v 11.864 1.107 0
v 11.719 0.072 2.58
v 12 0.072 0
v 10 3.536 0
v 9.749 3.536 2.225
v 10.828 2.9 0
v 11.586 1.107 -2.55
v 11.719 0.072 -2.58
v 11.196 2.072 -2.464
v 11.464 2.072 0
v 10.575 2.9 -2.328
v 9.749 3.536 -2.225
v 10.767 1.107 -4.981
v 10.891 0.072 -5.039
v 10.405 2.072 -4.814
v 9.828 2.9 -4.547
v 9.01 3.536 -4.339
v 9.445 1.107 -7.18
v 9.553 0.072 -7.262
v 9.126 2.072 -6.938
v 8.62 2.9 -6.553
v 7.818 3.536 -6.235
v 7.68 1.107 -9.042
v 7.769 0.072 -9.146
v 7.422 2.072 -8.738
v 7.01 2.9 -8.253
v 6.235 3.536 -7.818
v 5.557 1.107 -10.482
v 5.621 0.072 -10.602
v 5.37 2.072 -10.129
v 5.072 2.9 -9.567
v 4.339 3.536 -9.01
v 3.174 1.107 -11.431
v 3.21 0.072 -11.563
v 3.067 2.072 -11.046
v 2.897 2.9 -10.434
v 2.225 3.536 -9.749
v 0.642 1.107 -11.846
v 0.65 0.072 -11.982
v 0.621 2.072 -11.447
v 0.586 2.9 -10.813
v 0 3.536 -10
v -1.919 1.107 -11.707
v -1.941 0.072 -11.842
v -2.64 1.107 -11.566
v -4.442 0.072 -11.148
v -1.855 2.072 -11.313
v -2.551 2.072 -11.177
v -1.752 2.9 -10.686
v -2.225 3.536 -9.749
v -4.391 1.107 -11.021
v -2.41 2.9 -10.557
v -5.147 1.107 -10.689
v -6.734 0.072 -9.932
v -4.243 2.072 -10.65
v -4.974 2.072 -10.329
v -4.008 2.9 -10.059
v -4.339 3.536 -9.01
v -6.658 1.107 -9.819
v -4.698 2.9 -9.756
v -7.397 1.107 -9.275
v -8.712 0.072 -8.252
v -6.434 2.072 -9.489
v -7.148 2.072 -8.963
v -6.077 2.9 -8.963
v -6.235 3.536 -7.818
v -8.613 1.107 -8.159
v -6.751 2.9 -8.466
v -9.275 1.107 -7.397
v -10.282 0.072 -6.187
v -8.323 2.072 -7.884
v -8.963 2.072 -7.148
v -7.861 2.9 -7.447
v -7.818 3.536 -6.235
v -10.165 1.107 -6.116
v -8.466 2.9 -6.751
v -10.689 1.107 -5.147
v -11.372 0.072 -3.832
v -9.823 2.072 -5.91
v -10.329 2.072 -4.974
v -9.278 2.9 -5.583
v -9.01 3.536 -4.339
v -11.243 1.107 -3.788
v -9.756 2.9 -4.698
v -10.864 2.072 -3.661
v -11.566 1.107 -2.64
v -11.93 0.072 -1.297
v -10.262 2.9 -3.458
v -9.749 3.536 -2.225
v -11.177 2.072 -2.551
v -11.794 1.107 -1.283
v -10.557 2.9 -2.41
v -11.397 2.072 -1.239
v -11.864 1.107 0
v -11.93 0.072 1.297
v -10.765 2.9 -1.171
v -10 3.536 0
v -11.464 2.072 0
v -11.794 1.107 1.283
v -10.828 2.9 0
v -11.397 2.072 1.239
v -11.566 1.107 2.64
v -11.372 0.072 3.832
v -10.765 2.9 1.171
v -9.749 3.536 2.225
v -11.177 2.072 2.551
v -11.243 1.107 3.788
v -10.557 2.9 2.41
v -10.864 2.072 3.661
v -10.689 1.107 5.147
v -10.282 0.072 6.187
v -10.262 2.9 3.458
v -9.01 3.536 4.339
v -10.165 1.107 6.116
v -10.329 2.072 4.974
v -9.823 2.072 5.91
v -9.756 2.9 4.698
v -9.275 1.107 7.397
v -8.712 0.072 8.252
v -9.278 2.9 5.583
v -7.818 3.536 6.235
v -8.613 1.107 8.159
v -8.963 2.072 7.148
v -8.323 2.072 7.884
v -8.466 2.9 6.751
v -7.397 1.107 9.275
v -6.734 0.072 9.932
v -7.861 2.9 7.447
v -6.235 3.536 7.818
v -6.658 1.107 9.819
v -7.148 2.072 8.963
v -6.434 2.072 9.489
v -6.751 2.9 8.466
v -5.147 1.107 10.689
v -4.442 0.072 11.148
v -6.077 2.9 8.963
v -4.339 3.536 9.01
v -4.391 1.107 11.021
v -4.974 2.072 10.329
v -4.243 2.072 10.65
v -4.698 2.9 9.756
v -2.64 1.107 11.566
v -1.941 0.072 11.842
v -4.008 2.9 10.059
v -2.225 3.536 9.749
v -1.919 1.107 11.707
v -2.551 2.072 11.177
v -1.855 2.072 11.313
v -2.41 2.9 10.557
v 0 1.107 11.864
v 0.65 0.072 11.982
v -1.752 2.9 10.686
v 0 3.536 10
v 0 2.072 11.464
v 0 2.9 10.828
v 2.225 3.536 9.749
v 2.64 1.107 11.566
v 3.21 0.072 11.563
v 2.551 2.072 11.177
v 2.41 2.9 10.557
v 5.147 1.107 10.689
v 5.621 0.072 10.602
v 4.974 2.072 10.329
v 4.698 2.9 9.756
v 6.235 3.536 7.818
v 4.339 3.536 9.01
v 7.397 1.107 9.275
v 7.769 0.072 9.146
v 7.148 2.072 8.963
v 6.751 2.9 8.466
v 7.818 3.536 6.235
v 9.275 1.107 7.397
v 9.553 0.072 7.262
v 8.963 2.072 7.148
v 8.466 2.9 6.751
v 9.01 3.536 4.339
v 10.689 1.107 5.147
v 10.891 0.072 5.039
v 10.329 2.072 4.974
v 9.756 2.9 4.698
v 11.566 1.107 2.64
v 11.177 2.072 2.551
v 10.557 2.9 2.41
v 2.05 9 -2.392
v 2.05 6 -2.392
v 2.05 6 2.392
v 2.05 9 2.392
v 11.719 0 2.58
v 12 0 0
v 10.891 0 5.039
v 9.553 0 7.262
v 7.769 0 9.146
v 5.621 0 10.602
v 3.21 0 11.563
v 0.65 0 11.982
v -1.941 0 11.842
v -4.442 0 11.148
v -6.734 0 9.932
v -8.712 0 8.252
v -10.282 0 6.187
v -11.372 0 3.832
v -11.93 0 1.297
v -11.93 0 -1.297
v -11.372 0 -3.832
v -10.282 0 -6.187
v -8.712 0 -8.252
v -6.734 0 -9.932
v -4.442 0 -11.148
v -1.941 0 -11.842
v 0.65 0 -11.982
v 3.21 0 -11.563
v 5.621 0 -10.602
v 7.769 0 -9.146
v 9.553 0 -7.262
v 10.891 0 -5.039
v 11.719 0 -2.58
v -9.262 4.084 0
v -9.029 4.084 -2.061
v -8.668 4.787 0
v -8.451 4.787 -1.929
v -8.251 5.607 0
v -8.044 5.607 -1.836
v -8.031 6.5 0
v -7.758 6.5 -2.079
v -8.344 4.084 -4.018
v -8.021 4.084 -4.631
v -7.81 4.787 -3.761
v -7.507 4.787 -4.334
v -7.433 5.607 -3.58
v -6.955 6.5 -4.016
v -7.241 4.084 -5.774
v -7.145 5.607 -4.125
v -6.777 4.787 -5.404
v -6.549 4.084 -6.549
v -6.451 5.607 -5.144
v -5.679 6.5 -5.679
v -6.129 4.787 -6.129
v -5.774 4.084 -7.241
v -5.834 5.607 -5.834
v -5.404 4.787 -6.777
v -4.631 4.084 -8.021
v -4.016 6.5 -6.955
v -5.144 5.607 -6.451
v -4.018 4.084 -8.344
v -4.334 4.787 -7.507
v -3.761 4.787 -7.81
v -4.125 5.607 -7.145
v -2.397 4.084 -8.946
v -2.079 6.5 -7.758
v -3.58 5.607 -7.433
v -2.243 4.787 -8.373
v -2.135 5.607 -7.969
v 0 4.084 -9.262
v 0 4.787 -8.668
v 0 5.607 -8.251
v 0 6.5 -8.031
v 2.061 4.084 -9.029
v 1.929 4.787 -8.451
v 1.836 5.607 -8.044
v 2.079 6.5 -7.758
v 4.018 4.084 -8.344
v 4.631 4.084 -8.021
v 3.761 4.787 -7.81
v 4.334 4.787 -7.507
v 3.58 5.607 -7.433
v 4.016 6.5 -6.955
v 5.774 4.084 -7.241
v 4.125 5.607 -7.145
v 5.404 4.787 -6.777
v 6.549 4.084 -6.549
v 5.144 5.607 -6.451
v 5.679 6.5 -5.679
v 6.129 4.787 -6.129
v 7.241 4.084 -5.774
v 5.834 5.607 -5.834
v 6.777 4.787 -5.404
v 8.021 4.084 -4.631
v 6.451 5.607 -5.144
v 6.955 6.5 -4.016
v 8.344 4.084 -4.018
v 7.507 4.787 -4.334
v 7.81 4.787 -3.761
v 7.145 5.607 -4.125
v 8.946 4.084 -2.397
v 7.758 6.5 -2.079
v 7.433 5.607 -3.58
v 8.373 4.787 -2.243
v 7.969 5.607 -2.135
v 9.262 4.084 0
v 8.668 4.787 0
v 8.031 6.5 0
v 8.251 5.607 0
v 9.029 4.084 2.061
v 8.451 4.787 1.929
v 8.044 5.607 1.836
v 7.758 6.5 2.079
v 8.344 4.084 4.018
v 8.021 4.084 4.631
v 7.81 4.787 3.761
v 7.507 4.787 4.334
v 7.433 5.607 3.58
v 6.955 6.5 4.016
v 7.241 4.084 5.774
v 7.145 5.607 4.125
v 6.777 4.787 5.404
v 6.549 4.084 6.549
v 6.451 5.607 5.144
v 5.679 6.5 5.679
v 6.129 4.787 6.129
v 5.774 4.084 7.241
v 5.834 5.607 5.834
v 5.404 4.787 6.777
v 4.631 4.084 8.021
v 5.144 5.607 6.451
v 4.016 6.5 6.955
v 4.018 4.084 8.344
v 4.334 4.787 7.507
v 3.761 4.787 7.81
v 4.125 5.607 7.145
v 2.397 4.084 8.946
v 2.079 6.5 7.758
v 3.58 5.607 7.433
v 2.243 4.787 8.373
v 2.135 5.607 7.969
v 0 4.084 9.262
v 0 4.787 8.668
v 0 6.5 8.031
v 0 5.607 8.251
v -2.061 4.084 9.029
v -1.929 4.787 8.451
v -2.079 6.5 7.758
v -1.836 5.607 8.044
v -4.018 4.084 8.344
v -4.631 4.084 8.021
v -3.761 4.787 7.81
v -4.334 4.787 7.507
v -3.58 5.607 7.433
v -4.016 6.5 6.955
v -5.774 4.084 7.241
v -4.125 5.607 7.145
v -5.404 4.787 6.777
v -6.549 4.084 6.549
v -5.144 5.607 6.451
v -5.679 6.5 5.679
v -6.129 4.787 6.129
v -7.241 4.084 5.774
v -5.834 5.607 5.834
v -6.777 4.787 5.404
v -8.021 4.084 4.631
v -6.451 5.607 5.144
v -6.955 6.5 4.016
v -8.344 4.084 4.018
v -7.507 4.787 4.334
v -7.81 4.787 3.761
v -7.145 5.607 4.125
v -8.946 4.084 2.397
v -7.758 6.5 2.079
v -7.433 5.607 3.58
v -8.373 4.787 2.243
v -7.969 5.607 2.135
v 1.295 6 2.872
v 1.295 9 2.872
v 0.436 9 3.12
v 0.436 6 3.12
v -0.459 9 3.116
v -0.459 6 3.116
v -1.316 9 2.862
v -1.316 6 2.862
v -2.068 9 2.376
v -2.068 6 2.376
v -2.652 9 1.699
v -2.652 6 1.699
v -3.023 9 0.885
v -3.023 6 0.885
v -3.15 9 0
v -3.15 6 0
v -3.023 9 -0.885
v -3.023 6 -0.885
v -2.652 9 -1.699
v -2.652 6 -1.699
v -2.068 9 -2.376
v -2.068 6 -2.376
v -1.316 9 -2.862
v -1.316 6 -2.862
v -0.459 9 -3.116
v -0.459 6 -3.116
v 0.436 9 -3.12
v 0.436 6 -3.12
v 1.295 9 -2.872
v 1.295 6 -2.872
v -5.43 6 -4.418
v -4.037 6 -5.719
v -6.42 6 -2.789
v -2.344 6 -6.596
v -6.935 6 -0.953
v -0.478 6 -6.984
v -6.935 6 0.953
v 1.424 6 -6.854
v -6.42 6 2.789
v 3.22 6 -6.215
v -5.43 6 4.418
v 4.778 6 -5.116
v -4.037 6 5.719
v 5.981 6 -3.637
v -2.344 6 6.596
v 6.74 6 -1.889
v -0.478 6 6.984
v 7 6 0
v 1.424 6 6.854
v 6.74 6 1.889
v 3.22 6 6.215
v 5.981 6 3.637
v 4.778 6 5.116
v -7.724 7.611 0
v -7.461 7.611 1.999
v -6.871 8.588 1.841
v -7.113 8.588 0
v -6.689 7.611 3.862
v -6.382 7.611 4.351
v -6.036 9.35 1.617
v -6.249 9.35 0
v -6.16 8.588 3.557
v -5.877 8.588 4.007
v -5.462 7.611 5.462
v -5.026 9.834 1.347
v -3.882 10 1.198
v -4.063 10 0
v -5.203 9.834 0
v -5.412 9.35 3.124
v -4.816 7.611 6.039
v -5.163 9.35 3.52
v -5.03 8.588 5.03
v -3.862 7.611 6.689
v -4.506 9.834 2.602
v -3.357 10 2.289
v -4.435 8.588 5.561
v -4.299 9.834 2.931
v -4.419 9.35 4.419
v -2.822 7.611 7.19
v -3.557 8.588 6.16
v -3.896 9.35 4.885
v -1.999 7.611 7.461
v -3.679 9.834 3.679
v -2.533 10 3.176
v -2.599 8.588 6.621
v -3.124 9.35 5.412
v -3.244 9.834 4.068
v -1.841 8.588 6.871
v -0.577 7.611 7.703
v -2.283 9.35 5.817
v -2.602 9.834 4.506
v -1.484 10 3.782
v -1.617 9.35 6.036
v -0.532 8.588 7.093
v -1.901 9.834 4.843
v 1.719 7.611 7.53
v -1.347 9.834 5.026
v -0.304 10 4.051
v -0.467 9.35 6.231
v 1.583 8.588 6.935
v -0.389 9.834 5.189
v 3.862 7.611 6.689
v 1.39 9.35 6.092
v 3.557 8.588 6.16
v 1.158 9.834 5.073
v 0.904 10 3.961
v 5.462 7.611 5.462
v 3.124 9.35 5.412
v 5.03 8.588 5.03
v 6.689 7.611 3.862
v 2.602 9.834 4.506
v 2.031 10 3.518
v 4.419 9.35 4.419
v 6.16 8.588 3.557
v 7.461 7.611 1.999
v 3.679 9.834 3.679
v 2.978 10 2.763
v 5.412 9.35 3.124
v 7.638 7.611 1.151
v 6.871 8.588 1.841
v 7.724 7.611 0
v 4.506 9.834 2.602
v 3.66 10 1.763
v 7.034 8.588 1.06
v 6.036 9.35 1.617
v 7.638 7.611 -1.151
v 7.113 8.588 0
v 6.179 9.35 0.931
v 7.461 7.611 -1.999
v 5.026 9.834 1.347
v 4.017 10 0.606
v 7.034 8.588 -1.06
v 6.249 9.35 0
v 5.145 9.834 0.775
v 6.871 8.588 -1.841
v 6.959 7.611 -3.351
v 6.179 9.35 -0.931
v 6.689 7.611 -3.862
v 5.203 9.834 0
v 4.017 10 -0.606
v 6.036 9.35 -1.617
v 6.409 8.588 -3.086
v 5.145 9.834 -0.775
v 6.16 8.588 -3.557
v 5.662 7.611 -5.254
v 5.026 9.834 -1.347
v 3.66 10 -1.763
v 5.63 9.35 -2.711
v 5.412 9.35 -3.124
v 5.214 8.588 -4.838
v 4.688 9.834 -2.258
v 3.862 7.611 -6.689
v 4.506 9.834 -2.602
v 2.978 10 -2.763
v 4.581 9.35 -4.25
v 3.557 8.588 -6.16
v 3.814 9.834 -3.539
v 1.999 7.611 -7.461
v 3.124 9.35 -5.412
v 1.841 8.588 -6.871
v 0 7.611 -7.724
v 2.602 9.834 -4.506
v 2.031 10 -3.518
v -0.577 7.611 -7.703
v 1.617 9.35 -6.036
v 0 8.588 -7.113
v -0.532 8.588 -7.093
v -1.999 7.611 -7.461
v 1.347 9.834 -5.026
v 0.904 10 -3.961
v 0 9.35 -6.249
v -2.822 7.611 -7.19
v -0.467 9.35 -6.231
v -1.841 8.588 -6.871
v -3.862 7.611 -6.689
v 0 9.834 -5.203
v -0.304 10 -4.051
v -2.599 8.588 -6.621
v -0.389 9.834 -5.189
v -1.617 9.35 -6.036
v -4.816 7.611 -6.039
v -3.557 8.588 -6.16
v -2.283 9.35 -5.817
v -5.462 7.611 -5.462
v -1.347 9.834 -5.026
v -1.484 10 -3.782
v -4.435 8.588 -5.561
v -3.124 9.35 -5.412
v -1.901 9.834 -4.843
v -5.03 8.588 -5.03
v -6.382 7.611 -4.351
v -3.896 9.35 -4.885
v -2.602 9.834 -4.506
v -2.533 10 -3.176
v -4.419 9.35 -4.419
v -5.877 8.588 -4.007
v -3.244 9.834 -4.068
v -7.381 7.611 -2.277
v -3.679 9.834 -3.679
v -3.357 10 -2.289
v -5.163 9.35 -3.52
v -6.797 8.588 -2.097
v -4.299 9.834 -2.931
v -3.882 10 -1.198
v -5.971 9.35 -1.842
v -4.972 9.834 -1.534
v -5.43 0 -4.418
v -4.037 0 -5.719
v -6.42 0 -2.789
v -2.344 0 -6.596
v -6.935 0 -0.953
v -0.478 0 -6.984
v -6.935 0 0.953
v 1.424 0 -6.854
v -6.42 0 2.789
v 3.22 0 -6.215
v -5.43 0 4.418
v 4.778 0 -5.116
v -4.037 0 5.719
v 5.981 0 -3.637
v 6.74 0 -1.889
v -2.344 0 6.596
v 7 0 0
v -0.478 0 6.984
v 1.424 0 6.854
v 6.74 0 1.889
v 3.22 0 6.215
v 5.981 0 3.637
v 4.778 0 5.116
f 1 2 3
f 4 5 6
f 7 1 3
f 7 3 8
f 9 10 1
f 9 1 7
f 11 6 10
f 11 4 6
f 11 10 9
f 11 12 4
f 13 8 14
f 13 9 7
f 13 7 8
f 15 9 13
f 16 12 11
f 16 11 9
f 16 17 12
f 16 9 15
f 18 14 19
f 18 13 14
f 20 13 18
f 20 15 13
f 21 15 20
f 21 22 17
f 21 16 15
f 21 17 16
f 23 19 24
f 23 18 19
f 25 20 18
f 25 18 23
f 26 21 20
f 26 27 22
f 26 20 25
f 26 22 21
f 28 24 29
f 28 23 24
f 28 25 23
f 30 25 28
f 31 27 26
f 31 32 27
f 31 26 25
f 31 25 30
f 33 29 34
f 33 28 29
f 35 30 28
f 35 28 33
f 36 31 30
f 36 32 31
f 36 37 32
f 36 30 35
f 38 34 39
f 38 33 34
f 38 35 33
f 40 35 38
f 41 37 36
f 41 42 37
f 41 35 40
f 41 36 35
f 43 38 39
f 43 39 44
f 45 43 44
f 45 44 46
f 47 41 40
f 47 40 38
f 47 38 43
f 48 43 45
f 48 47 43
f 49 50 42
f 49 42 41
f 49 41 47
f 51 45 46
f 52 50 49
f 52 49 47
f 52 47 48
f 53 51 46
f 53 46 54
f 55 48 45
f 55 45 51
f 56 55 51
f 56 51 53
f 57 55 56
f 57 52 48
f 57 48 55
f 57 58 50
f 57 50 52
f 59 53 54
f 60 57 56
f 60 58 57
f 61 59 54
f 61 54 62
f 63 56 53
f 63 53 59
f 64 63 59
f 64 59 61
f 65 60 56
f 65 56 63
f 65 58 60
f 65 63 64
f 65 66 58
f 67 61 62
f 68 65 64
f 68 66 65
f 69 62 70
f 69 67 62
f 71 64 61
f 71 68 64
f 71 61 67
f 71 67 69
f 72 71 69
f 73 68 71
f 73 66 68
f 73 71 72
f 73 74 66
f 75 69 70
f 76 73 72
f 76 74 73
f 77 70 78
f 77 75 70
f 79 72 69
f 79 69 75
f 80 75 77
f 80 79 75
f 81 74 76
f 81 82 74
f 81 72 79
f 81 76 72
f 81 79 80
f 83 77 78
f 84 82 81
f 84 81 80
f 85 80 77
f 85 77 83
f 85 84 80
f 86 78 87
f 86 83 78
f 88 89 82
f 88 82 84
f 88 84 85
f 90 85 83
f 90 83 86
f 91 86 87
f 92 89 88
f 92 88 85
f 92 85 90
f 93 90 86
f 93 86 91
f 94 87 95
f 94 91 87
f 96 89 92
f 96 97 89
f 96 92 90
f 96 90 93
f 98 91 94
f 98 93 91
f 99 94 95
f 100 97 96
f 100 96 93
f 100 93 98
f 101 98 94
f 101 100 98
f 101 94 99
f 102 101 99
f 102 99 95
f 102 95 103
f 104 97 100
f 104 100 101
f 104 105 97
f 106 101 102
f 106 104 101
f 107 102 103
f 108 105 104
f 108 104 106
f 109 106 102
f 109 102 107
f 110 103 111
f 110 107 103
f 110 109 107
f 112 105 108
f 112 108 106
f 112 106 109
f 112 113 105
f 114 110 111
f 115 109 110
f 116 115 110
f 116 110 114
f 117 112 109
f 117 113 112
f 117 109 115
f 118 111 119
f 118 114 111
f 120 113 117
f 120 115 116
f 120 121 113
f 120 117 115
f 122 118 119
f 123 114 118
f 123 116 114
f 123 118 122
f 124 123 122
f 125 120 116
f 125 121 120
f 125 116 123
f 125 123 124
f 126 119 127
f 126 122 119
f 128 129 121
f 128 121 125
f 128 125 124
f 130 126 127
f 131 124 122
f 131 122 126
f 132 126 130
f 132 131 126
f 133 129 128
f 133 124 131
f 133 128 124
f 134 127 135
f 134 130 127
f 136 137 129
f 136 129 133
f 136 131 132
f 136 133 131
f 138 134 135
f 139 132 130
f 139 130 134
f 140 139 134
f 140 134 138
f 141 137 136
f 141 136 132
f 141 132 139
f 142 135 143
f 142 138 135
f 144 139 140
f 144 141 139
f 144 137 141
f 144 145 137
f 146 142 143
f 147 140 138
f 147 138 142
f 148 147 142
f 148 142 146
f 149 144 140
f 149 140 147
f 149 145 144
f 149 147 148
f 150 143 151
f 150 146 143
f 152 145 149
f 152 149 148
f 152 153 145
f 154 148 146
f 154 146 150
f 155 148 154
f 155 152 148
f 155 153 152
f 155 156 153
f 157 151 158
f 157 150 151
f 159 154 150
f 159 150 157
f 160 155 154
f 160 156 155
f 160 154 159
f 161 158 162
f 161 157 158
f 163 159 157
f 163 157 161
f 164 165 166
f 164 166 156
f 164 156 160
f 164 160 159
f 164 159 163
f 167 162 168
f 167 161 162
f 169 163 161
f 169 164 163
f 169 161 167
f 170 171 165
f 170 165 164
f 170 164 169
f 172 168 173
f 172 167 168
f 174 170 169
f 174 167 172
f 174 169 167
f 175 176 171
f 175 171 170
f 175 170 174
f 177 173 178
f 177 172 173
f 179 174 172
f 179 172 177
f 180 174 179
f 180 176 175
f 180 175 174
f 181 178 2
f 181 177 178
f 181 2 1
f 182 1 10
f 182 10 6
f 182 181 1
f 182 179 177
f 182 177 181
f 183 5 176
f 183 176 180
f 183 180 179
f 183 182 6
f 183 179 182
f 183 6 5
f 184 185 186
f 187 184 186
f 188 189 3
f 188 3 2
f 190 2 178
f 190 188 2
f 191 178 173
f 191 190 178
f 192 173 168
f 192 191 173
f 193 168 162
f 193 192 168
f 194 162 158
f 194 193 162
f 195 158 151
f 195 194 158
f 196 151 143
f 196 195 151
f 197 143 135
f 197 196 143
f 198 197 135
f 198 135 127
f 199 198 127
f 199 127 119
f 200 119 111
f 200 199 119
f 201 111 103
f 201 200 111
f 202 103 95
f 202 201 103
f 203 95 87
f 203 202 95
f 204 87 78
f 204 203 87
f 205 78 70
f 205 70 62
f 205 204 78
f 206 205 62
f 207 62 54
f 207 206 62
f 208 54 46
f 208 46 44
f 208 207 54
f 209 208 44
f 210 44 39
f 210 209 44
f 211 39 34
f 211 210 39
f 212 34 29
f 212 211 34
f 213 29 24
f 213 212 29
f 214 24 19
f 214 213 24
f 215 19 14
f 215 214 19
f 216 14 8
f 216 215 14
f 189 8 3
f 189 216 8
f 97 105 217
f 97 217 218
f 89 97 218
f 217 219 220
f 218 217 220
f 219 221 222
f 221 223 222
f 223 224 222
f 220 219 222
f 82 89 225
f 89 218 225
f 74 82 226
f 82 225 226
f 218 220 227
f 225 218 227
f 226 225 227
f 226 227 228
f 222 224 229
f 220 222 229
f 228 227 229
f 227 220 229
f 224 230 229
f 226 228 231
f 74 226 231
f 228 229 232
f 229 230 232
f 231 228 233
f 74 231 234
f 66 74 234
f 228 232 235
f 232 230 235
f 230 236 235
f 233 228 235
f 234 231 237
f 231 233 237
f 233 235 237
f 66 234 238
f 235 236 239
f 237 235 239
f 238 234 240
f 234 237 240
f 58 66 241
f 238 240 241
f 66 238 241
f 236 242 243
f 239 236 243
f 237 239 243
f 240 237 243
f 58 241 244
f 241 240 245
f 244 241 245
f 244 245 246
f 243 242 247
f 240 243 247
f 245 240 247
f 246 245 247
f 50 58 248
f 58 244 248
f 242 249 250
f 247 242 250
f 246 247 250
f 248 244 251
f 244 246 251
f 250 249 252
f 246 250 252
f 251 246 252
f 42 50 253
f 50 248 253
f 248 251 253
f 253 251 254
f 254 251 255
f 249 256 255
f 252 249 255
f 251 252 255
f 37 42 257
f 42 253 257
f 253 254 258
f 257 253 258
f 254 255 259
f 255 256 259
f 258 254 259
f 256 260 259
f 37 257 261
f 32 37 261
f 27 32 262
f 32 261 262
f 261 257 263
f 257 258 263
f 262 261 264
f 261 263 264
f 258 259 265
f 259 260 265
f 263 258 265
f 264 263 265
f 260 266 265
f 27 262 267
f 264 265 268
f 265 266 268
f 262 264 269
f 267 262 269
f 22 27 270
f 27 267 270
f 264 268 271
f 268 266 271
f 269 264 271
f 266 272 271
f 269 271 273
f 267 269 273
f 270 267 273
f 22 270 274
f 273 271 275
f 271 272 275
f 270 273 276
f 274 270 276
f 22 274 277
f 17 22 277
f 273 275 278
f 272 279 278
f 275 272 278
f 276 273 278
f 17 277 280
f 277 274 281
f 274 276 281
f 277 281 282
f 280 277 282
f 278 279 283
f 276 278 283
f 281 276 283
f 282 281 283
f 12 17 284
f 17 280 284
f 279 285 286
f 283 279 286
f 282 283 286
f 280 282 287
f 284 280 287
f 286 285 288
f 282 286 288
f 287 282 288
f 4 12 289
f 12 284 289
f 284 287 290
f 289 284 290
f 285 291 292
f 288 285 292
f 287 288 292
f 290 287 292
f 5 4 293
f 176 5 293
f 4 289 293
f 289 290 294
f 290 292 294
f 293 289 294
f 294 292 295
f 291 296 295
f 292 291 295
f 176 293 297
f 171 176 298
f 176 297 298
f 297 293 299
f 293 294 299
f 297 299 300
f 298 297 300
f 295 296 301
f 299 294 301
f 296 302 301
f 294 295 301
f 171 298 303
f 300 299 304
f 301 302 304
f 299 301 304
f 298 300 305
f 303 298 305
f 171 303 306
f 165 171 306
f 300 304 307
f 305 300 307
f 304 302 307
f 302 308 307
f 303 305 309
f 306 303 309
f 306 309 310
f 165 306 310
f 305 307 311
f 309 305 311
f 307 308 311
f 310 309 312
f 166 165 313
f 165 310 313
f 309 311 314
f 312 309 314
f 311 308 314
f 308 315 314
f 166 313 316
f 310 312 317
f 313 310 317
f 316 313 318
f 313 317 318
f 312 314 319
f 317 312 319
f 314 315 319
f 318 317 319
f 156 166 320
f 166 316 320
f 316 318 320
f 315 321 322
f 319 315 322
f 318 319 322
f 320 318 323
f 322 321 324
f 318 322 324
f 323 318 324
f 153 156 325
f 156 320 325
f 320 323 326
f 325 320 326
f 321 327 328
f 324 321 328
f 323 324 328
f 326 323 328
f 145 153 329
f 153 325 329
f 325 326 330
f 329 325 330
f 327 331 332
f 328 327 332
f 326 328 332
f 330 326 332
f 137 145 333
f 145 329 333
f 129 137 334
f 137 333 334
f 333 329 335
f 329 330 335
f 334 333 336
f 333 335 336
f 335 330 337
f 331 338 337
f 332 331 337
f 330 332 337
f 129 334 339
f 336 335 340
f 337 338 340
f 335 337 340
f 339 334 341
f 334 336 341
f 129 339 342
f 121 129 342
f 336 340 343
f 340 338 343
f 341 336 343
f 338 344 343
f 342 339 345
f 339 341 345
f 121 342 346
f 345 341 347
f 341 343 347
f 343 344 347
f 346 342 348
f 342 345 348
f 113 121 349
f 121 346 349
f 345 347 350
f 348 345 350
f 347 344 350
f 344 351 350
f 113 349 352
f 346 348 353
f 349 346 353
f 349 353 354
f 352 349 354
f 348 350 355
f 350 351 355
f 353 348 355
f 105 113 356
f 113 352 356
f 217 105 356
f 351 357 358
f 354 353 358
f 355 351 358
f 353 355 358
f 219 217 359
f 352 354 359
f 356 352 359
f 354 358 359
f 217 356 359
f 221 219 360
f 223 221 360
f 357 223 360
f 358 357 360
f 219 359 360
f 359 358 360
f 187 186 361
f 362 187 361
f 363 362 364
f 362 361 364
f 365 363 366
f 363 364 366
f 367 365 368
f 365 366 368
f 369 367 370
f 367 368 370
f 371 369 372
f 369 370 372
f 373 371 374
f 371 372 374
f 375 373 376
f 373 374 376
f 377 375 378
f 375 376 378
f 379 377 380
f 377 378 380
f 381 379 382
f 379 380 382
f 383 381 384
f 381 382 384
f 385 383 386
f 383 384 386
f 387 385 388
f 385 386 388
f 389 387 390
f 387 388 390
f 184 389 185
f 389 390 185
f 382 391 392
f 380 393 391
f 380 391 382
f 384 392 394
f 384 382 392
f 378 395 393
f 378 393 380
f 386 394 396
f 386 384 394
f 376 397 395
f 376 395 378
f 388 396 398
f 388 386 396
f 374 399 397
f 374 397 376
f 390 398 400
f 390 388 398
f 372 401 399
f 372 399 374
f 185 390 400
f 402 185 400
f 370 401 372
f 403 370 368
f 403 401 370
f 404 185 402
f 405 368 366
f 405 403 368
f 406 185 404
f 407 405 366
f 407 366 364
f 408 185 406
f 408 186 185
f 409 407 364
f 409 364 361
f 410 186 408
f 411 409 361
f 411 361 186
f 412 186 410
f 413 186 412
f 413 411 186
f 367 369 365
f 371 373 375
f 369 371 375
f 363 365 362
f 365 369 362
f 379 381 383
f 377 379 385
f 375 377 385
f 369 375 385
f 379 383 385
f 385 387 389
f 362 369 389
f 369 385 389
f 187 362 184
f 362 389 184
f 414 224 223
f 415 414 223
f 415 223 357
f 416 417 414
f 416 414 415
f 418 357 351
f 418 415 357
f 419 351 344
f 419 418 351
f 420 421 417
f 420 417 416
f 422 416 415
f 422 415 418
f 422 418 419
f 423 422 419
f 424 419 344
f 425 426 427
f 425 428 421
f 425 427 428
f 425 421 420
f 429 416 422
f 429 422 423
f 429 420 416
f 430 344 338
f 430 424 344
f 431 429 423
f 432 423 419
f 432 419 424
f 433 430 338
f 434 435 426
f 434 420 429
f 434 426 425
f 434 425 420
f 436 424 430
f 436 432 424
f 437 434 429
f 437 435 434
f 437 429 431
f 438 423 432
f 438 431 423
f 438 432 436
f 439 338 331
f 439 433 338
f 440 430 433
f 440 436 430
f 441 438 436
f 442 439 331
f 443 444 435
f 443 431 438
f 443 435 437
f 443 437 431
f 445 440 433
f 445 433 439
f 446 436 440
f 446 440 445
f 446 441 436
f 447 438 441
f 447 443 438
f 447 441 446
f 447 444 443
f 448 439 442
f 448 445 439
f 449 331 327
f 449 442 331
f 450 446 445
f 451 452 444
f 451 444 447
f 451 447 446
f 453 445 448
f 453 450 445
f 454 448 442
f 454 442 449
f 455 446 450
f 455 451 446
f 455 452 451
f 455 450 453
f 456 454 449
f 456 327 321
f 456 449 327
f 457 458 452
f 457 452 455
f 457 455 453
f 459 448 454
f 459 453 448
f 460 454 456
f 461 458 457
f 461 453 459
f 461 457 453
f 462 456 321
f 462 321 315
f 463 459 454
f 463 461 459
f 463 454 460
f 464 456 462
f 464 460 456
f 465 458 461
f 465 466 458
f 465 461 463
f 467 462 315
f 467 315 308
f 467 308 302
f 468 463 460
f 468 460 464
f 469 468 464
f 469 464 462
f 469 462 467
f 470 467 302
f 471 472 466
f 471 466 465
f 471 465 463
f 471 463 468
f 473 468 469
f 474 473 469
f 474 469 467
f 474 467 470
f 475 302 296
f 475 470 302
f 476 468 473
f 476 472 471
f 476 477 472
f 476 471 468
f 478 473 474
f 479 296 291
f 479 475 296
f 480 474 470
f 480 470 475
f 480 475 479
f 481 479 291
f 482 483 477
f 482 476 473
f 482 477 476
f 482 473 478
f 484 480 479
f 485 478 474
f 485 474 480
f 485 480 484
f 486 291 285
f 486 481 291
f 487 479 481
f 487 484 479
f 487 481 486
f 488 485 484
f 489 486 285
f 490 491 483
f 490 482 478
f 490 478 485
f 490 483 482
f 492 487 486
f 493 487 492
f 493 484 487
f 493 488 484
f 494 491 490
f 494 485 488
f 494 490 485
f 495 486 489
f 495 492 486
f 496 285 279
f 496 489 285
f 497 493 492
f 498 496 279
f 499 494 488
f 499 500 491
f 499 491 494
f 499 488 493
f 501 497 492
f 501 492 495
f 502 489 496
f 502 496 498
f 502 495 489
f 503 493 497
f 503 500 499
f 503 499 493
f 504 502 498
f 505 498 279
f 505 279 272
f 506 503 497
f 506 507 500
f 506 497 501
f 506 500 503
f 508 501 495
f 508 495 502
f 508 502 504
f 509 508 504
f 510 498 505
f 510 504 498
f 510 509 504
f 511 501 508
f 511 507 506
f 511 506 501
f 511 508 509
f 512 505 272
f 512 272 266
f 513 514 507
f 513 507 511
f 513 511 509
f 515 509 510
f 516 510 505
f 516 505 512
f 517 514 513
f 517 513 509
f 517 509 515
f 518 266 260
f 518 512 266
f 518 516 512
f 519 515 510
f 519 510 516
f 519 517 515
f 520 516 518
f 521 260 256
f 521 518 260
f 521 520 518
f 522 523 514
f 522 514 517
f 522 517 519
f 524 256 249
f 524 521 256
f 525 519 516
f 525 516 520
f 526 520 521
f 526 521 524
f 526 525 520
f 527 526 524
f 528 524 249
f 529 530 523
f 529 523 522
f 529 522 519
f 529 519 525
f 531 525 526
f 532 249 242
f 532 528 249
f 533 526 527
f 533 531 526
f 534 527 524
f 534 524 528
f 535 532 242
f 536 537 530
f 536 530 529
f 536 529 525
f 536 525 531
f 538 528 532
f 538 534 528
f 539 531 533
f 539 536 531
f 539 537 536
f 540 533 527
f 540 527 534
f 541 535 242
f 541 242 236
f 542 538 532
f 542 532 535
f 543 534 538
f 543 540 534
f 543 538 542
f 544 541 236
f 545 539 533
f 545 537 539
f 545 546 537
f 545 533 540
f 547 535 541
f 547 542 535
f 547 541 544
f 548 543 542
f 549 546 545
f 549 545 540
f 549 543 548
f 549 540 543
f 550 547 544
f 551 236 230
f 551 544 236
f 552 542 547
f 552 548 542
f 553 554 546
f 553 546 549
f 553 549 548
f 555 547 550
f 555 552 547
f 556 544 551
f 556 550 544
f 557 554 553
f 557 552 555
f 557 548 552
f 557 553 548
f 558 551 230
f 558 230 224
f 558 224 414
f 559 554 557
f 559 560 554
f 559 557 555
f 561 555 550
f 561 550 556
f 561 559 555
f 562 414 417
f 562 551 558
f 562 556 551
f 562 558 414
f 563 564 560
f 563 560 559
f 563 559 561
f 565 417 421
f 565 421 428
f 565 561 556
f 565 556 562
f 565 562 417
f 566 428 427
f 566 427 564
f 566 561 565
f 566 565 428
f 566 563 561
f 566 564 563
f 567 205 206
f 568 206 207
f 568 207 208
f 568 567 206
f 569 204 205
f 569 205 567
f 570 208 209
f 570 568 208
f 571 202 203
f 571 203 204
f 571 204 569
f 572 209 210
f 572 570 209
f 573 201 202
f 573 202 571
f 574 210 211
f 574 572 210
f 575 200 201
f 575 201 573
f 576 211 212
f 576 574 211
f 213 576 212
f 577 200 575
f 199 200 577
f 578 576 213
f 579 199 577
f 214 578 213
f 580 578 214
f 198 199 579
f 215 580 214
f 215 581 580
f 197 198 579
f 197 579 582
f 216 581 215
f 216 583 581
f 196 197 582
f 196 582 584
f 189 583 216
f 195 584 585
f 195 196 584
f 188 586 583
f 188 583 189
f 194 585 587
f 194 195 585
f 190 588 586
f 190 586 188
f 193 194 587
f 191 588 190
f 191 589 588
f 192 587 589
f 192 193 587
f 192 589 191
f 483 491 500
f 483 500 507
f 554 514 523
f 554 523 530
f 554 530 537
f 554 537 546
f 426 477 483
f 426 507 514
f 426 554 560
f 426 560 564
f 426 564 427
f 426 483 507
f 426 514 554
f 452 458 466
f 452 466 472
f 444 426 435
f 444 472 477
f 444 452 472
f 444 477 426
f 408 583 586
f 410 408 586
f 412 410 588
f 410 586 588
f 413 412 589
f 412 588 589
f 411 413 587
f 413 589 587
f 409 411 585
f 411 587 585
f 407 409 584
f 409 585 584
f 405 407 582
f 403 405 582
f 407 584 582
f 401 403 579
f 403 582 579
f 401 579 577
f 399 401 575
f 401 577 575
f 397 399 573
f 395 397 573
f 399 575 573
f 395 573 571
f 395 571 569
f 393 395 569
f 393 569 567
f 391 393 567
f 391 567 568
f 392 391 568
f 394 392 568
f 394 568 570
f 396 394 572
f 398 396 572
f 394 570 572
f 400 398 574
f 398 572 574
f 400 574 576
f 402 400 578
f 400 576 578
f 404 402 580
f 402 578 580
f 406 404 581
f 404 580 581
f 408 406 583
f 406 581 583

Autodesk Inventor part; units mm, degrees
ref_plane "YZ Plane" through (0, 0, 0) normal (1, 0, 0) x (0, 1, 0)
ref_plane "XZ Plane" through (0, 0, 0) normal (0, 1, 0) x (-1, 0, 0)
ref_plane "XY Plane" through (0, 0, 0) normal (0, 0, 1) x (1, 0, 0)
sketch "Sketch1" plane through (0, 0, 0) normal (0, 1, 0) x (-1, 0, 0)
  arc A0 (-2.05, -2.3917) -> (-2.05, 2.3917) centre (0, 0) ccw
  line L0 (3.15, 0) -> (-2.05, 0)
  line L1 (-2.05, 0) -> (-2.05, -2.3917)
  line L2 (-2.05, 0) -> (-2.05, 2.3917)
  circle A1 centre (0, 0) radius 8
  dimension "d0" = 6.3
  dimension "d1" = 5.2
  dimension "d2" = 16
extrude "Extrusion1" add sketch "Sketch1" along normal blind 10
sketch "Sketch2" plane through (0, 10, 0) normal (0, 1, 0) x (1, 0, 0)
  arc A0 (2.05, 2.3917) -> (2.05, -2.3917) centre (0, 0) ccw projected
  line L0 (2.05, 2.3917) -> (2.05, -2.3917) projected
extrude "Extrusion2" add sketch "Sketch2" against normal blind 1
sketch "Sketch3" plane through (0, 0, 0) normal (0, -1, 0) x (1, 0, 0)
  arc A0 (2.05, 2.3917) -> (2.05, -2.3917) centre (0, 0) ccw projected
  line L0 (2.05, 2.3917) -> (2.05, -2.3917) projected
  circle A1 centre (0, 0) radius 7
  dimension "d7" = 14
extrude "Extrusion3" cut sketch "Sketch3" against normal blind 6
sketch "Sketch4" plane through (0, 0, 0) normal (0, -1, 0) x (1, 0, 0)
  circle A0 centre (0, 0) radius 8 projected
  circle A1 centre (0, 0) radius 12
  dimension "d10" = 24
extrude "Extrusion4" add sketch "Sketch4" against normal blind 3
fillet "Fillet1" radius 4 3 edges at (8, 3, 0) (-12, 3, 0) (8, 10, 0)
properties part number "galka enkodera"
